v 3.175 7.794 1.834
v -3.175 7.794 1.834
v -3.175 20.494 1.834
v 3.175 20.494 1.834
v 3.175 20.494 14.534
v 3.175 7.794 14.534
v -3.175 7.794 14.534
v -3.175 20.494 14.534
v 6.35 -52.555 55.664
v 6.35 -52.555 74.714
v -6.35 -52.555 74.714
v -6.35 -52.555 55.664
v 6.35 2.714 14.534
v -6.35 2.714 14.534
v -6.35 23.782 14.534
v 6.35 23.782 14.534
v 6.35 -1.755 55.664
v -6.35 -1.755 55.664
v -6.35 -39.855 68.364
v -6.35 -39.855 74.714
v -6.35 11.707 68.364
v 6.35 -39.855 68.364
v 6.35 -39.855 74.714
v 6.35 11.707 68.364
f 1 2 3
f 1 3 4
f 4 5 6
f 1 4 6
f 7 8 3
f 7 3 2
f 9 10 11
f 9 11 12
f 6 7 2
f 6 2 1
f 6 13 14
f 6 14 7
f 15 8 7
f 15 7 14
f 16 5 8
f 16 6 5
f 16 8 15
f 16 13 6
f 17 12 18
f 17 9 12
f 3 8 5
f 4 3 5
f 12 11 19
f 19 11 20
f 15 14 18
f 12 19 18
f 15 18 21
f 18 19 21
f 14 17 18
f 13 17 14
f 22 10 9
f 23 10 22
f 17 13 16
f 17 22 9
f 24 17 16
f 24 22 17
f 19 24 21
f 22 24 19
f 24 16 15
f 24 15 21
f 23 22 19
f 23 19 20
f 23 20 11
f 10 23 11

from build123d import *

# Parameters (mm, degrees)
F1_DEPTH = 6.35
F2_W     = 6.35
F2_H     = 12.7
F3_DEPTH = 12.7


with BuildPart() as f1:
    # F0 (on Right) → F1 (new body, symmetric)
    with BuildSketch(Plane.YZ):
        Polygon((2.713958, 14.533968), (23.782384, 14.533968), (11.706621, 68.364052), (-39.854848, 68.364052), (-39.854848, 74.714052), (-52.554848, 74.714052), (-52.554848, 55.664052), (-1.754848, 55.664052), align=None)
    extrude(amount=F1_DEPTH, both=True)

    # F2 (on face) → F3 (join)
    with BuildSketch(Plane(origin=(0, 0, 14.533968), x_dir=(1, 0, 0), z_dir=(0, 0, -1))):
        with Locations((0, -14.143958)):
            Rectangle(F2_W, F2_H)
    extrude(amount=F3_DEPTH)


solid = f1.part
